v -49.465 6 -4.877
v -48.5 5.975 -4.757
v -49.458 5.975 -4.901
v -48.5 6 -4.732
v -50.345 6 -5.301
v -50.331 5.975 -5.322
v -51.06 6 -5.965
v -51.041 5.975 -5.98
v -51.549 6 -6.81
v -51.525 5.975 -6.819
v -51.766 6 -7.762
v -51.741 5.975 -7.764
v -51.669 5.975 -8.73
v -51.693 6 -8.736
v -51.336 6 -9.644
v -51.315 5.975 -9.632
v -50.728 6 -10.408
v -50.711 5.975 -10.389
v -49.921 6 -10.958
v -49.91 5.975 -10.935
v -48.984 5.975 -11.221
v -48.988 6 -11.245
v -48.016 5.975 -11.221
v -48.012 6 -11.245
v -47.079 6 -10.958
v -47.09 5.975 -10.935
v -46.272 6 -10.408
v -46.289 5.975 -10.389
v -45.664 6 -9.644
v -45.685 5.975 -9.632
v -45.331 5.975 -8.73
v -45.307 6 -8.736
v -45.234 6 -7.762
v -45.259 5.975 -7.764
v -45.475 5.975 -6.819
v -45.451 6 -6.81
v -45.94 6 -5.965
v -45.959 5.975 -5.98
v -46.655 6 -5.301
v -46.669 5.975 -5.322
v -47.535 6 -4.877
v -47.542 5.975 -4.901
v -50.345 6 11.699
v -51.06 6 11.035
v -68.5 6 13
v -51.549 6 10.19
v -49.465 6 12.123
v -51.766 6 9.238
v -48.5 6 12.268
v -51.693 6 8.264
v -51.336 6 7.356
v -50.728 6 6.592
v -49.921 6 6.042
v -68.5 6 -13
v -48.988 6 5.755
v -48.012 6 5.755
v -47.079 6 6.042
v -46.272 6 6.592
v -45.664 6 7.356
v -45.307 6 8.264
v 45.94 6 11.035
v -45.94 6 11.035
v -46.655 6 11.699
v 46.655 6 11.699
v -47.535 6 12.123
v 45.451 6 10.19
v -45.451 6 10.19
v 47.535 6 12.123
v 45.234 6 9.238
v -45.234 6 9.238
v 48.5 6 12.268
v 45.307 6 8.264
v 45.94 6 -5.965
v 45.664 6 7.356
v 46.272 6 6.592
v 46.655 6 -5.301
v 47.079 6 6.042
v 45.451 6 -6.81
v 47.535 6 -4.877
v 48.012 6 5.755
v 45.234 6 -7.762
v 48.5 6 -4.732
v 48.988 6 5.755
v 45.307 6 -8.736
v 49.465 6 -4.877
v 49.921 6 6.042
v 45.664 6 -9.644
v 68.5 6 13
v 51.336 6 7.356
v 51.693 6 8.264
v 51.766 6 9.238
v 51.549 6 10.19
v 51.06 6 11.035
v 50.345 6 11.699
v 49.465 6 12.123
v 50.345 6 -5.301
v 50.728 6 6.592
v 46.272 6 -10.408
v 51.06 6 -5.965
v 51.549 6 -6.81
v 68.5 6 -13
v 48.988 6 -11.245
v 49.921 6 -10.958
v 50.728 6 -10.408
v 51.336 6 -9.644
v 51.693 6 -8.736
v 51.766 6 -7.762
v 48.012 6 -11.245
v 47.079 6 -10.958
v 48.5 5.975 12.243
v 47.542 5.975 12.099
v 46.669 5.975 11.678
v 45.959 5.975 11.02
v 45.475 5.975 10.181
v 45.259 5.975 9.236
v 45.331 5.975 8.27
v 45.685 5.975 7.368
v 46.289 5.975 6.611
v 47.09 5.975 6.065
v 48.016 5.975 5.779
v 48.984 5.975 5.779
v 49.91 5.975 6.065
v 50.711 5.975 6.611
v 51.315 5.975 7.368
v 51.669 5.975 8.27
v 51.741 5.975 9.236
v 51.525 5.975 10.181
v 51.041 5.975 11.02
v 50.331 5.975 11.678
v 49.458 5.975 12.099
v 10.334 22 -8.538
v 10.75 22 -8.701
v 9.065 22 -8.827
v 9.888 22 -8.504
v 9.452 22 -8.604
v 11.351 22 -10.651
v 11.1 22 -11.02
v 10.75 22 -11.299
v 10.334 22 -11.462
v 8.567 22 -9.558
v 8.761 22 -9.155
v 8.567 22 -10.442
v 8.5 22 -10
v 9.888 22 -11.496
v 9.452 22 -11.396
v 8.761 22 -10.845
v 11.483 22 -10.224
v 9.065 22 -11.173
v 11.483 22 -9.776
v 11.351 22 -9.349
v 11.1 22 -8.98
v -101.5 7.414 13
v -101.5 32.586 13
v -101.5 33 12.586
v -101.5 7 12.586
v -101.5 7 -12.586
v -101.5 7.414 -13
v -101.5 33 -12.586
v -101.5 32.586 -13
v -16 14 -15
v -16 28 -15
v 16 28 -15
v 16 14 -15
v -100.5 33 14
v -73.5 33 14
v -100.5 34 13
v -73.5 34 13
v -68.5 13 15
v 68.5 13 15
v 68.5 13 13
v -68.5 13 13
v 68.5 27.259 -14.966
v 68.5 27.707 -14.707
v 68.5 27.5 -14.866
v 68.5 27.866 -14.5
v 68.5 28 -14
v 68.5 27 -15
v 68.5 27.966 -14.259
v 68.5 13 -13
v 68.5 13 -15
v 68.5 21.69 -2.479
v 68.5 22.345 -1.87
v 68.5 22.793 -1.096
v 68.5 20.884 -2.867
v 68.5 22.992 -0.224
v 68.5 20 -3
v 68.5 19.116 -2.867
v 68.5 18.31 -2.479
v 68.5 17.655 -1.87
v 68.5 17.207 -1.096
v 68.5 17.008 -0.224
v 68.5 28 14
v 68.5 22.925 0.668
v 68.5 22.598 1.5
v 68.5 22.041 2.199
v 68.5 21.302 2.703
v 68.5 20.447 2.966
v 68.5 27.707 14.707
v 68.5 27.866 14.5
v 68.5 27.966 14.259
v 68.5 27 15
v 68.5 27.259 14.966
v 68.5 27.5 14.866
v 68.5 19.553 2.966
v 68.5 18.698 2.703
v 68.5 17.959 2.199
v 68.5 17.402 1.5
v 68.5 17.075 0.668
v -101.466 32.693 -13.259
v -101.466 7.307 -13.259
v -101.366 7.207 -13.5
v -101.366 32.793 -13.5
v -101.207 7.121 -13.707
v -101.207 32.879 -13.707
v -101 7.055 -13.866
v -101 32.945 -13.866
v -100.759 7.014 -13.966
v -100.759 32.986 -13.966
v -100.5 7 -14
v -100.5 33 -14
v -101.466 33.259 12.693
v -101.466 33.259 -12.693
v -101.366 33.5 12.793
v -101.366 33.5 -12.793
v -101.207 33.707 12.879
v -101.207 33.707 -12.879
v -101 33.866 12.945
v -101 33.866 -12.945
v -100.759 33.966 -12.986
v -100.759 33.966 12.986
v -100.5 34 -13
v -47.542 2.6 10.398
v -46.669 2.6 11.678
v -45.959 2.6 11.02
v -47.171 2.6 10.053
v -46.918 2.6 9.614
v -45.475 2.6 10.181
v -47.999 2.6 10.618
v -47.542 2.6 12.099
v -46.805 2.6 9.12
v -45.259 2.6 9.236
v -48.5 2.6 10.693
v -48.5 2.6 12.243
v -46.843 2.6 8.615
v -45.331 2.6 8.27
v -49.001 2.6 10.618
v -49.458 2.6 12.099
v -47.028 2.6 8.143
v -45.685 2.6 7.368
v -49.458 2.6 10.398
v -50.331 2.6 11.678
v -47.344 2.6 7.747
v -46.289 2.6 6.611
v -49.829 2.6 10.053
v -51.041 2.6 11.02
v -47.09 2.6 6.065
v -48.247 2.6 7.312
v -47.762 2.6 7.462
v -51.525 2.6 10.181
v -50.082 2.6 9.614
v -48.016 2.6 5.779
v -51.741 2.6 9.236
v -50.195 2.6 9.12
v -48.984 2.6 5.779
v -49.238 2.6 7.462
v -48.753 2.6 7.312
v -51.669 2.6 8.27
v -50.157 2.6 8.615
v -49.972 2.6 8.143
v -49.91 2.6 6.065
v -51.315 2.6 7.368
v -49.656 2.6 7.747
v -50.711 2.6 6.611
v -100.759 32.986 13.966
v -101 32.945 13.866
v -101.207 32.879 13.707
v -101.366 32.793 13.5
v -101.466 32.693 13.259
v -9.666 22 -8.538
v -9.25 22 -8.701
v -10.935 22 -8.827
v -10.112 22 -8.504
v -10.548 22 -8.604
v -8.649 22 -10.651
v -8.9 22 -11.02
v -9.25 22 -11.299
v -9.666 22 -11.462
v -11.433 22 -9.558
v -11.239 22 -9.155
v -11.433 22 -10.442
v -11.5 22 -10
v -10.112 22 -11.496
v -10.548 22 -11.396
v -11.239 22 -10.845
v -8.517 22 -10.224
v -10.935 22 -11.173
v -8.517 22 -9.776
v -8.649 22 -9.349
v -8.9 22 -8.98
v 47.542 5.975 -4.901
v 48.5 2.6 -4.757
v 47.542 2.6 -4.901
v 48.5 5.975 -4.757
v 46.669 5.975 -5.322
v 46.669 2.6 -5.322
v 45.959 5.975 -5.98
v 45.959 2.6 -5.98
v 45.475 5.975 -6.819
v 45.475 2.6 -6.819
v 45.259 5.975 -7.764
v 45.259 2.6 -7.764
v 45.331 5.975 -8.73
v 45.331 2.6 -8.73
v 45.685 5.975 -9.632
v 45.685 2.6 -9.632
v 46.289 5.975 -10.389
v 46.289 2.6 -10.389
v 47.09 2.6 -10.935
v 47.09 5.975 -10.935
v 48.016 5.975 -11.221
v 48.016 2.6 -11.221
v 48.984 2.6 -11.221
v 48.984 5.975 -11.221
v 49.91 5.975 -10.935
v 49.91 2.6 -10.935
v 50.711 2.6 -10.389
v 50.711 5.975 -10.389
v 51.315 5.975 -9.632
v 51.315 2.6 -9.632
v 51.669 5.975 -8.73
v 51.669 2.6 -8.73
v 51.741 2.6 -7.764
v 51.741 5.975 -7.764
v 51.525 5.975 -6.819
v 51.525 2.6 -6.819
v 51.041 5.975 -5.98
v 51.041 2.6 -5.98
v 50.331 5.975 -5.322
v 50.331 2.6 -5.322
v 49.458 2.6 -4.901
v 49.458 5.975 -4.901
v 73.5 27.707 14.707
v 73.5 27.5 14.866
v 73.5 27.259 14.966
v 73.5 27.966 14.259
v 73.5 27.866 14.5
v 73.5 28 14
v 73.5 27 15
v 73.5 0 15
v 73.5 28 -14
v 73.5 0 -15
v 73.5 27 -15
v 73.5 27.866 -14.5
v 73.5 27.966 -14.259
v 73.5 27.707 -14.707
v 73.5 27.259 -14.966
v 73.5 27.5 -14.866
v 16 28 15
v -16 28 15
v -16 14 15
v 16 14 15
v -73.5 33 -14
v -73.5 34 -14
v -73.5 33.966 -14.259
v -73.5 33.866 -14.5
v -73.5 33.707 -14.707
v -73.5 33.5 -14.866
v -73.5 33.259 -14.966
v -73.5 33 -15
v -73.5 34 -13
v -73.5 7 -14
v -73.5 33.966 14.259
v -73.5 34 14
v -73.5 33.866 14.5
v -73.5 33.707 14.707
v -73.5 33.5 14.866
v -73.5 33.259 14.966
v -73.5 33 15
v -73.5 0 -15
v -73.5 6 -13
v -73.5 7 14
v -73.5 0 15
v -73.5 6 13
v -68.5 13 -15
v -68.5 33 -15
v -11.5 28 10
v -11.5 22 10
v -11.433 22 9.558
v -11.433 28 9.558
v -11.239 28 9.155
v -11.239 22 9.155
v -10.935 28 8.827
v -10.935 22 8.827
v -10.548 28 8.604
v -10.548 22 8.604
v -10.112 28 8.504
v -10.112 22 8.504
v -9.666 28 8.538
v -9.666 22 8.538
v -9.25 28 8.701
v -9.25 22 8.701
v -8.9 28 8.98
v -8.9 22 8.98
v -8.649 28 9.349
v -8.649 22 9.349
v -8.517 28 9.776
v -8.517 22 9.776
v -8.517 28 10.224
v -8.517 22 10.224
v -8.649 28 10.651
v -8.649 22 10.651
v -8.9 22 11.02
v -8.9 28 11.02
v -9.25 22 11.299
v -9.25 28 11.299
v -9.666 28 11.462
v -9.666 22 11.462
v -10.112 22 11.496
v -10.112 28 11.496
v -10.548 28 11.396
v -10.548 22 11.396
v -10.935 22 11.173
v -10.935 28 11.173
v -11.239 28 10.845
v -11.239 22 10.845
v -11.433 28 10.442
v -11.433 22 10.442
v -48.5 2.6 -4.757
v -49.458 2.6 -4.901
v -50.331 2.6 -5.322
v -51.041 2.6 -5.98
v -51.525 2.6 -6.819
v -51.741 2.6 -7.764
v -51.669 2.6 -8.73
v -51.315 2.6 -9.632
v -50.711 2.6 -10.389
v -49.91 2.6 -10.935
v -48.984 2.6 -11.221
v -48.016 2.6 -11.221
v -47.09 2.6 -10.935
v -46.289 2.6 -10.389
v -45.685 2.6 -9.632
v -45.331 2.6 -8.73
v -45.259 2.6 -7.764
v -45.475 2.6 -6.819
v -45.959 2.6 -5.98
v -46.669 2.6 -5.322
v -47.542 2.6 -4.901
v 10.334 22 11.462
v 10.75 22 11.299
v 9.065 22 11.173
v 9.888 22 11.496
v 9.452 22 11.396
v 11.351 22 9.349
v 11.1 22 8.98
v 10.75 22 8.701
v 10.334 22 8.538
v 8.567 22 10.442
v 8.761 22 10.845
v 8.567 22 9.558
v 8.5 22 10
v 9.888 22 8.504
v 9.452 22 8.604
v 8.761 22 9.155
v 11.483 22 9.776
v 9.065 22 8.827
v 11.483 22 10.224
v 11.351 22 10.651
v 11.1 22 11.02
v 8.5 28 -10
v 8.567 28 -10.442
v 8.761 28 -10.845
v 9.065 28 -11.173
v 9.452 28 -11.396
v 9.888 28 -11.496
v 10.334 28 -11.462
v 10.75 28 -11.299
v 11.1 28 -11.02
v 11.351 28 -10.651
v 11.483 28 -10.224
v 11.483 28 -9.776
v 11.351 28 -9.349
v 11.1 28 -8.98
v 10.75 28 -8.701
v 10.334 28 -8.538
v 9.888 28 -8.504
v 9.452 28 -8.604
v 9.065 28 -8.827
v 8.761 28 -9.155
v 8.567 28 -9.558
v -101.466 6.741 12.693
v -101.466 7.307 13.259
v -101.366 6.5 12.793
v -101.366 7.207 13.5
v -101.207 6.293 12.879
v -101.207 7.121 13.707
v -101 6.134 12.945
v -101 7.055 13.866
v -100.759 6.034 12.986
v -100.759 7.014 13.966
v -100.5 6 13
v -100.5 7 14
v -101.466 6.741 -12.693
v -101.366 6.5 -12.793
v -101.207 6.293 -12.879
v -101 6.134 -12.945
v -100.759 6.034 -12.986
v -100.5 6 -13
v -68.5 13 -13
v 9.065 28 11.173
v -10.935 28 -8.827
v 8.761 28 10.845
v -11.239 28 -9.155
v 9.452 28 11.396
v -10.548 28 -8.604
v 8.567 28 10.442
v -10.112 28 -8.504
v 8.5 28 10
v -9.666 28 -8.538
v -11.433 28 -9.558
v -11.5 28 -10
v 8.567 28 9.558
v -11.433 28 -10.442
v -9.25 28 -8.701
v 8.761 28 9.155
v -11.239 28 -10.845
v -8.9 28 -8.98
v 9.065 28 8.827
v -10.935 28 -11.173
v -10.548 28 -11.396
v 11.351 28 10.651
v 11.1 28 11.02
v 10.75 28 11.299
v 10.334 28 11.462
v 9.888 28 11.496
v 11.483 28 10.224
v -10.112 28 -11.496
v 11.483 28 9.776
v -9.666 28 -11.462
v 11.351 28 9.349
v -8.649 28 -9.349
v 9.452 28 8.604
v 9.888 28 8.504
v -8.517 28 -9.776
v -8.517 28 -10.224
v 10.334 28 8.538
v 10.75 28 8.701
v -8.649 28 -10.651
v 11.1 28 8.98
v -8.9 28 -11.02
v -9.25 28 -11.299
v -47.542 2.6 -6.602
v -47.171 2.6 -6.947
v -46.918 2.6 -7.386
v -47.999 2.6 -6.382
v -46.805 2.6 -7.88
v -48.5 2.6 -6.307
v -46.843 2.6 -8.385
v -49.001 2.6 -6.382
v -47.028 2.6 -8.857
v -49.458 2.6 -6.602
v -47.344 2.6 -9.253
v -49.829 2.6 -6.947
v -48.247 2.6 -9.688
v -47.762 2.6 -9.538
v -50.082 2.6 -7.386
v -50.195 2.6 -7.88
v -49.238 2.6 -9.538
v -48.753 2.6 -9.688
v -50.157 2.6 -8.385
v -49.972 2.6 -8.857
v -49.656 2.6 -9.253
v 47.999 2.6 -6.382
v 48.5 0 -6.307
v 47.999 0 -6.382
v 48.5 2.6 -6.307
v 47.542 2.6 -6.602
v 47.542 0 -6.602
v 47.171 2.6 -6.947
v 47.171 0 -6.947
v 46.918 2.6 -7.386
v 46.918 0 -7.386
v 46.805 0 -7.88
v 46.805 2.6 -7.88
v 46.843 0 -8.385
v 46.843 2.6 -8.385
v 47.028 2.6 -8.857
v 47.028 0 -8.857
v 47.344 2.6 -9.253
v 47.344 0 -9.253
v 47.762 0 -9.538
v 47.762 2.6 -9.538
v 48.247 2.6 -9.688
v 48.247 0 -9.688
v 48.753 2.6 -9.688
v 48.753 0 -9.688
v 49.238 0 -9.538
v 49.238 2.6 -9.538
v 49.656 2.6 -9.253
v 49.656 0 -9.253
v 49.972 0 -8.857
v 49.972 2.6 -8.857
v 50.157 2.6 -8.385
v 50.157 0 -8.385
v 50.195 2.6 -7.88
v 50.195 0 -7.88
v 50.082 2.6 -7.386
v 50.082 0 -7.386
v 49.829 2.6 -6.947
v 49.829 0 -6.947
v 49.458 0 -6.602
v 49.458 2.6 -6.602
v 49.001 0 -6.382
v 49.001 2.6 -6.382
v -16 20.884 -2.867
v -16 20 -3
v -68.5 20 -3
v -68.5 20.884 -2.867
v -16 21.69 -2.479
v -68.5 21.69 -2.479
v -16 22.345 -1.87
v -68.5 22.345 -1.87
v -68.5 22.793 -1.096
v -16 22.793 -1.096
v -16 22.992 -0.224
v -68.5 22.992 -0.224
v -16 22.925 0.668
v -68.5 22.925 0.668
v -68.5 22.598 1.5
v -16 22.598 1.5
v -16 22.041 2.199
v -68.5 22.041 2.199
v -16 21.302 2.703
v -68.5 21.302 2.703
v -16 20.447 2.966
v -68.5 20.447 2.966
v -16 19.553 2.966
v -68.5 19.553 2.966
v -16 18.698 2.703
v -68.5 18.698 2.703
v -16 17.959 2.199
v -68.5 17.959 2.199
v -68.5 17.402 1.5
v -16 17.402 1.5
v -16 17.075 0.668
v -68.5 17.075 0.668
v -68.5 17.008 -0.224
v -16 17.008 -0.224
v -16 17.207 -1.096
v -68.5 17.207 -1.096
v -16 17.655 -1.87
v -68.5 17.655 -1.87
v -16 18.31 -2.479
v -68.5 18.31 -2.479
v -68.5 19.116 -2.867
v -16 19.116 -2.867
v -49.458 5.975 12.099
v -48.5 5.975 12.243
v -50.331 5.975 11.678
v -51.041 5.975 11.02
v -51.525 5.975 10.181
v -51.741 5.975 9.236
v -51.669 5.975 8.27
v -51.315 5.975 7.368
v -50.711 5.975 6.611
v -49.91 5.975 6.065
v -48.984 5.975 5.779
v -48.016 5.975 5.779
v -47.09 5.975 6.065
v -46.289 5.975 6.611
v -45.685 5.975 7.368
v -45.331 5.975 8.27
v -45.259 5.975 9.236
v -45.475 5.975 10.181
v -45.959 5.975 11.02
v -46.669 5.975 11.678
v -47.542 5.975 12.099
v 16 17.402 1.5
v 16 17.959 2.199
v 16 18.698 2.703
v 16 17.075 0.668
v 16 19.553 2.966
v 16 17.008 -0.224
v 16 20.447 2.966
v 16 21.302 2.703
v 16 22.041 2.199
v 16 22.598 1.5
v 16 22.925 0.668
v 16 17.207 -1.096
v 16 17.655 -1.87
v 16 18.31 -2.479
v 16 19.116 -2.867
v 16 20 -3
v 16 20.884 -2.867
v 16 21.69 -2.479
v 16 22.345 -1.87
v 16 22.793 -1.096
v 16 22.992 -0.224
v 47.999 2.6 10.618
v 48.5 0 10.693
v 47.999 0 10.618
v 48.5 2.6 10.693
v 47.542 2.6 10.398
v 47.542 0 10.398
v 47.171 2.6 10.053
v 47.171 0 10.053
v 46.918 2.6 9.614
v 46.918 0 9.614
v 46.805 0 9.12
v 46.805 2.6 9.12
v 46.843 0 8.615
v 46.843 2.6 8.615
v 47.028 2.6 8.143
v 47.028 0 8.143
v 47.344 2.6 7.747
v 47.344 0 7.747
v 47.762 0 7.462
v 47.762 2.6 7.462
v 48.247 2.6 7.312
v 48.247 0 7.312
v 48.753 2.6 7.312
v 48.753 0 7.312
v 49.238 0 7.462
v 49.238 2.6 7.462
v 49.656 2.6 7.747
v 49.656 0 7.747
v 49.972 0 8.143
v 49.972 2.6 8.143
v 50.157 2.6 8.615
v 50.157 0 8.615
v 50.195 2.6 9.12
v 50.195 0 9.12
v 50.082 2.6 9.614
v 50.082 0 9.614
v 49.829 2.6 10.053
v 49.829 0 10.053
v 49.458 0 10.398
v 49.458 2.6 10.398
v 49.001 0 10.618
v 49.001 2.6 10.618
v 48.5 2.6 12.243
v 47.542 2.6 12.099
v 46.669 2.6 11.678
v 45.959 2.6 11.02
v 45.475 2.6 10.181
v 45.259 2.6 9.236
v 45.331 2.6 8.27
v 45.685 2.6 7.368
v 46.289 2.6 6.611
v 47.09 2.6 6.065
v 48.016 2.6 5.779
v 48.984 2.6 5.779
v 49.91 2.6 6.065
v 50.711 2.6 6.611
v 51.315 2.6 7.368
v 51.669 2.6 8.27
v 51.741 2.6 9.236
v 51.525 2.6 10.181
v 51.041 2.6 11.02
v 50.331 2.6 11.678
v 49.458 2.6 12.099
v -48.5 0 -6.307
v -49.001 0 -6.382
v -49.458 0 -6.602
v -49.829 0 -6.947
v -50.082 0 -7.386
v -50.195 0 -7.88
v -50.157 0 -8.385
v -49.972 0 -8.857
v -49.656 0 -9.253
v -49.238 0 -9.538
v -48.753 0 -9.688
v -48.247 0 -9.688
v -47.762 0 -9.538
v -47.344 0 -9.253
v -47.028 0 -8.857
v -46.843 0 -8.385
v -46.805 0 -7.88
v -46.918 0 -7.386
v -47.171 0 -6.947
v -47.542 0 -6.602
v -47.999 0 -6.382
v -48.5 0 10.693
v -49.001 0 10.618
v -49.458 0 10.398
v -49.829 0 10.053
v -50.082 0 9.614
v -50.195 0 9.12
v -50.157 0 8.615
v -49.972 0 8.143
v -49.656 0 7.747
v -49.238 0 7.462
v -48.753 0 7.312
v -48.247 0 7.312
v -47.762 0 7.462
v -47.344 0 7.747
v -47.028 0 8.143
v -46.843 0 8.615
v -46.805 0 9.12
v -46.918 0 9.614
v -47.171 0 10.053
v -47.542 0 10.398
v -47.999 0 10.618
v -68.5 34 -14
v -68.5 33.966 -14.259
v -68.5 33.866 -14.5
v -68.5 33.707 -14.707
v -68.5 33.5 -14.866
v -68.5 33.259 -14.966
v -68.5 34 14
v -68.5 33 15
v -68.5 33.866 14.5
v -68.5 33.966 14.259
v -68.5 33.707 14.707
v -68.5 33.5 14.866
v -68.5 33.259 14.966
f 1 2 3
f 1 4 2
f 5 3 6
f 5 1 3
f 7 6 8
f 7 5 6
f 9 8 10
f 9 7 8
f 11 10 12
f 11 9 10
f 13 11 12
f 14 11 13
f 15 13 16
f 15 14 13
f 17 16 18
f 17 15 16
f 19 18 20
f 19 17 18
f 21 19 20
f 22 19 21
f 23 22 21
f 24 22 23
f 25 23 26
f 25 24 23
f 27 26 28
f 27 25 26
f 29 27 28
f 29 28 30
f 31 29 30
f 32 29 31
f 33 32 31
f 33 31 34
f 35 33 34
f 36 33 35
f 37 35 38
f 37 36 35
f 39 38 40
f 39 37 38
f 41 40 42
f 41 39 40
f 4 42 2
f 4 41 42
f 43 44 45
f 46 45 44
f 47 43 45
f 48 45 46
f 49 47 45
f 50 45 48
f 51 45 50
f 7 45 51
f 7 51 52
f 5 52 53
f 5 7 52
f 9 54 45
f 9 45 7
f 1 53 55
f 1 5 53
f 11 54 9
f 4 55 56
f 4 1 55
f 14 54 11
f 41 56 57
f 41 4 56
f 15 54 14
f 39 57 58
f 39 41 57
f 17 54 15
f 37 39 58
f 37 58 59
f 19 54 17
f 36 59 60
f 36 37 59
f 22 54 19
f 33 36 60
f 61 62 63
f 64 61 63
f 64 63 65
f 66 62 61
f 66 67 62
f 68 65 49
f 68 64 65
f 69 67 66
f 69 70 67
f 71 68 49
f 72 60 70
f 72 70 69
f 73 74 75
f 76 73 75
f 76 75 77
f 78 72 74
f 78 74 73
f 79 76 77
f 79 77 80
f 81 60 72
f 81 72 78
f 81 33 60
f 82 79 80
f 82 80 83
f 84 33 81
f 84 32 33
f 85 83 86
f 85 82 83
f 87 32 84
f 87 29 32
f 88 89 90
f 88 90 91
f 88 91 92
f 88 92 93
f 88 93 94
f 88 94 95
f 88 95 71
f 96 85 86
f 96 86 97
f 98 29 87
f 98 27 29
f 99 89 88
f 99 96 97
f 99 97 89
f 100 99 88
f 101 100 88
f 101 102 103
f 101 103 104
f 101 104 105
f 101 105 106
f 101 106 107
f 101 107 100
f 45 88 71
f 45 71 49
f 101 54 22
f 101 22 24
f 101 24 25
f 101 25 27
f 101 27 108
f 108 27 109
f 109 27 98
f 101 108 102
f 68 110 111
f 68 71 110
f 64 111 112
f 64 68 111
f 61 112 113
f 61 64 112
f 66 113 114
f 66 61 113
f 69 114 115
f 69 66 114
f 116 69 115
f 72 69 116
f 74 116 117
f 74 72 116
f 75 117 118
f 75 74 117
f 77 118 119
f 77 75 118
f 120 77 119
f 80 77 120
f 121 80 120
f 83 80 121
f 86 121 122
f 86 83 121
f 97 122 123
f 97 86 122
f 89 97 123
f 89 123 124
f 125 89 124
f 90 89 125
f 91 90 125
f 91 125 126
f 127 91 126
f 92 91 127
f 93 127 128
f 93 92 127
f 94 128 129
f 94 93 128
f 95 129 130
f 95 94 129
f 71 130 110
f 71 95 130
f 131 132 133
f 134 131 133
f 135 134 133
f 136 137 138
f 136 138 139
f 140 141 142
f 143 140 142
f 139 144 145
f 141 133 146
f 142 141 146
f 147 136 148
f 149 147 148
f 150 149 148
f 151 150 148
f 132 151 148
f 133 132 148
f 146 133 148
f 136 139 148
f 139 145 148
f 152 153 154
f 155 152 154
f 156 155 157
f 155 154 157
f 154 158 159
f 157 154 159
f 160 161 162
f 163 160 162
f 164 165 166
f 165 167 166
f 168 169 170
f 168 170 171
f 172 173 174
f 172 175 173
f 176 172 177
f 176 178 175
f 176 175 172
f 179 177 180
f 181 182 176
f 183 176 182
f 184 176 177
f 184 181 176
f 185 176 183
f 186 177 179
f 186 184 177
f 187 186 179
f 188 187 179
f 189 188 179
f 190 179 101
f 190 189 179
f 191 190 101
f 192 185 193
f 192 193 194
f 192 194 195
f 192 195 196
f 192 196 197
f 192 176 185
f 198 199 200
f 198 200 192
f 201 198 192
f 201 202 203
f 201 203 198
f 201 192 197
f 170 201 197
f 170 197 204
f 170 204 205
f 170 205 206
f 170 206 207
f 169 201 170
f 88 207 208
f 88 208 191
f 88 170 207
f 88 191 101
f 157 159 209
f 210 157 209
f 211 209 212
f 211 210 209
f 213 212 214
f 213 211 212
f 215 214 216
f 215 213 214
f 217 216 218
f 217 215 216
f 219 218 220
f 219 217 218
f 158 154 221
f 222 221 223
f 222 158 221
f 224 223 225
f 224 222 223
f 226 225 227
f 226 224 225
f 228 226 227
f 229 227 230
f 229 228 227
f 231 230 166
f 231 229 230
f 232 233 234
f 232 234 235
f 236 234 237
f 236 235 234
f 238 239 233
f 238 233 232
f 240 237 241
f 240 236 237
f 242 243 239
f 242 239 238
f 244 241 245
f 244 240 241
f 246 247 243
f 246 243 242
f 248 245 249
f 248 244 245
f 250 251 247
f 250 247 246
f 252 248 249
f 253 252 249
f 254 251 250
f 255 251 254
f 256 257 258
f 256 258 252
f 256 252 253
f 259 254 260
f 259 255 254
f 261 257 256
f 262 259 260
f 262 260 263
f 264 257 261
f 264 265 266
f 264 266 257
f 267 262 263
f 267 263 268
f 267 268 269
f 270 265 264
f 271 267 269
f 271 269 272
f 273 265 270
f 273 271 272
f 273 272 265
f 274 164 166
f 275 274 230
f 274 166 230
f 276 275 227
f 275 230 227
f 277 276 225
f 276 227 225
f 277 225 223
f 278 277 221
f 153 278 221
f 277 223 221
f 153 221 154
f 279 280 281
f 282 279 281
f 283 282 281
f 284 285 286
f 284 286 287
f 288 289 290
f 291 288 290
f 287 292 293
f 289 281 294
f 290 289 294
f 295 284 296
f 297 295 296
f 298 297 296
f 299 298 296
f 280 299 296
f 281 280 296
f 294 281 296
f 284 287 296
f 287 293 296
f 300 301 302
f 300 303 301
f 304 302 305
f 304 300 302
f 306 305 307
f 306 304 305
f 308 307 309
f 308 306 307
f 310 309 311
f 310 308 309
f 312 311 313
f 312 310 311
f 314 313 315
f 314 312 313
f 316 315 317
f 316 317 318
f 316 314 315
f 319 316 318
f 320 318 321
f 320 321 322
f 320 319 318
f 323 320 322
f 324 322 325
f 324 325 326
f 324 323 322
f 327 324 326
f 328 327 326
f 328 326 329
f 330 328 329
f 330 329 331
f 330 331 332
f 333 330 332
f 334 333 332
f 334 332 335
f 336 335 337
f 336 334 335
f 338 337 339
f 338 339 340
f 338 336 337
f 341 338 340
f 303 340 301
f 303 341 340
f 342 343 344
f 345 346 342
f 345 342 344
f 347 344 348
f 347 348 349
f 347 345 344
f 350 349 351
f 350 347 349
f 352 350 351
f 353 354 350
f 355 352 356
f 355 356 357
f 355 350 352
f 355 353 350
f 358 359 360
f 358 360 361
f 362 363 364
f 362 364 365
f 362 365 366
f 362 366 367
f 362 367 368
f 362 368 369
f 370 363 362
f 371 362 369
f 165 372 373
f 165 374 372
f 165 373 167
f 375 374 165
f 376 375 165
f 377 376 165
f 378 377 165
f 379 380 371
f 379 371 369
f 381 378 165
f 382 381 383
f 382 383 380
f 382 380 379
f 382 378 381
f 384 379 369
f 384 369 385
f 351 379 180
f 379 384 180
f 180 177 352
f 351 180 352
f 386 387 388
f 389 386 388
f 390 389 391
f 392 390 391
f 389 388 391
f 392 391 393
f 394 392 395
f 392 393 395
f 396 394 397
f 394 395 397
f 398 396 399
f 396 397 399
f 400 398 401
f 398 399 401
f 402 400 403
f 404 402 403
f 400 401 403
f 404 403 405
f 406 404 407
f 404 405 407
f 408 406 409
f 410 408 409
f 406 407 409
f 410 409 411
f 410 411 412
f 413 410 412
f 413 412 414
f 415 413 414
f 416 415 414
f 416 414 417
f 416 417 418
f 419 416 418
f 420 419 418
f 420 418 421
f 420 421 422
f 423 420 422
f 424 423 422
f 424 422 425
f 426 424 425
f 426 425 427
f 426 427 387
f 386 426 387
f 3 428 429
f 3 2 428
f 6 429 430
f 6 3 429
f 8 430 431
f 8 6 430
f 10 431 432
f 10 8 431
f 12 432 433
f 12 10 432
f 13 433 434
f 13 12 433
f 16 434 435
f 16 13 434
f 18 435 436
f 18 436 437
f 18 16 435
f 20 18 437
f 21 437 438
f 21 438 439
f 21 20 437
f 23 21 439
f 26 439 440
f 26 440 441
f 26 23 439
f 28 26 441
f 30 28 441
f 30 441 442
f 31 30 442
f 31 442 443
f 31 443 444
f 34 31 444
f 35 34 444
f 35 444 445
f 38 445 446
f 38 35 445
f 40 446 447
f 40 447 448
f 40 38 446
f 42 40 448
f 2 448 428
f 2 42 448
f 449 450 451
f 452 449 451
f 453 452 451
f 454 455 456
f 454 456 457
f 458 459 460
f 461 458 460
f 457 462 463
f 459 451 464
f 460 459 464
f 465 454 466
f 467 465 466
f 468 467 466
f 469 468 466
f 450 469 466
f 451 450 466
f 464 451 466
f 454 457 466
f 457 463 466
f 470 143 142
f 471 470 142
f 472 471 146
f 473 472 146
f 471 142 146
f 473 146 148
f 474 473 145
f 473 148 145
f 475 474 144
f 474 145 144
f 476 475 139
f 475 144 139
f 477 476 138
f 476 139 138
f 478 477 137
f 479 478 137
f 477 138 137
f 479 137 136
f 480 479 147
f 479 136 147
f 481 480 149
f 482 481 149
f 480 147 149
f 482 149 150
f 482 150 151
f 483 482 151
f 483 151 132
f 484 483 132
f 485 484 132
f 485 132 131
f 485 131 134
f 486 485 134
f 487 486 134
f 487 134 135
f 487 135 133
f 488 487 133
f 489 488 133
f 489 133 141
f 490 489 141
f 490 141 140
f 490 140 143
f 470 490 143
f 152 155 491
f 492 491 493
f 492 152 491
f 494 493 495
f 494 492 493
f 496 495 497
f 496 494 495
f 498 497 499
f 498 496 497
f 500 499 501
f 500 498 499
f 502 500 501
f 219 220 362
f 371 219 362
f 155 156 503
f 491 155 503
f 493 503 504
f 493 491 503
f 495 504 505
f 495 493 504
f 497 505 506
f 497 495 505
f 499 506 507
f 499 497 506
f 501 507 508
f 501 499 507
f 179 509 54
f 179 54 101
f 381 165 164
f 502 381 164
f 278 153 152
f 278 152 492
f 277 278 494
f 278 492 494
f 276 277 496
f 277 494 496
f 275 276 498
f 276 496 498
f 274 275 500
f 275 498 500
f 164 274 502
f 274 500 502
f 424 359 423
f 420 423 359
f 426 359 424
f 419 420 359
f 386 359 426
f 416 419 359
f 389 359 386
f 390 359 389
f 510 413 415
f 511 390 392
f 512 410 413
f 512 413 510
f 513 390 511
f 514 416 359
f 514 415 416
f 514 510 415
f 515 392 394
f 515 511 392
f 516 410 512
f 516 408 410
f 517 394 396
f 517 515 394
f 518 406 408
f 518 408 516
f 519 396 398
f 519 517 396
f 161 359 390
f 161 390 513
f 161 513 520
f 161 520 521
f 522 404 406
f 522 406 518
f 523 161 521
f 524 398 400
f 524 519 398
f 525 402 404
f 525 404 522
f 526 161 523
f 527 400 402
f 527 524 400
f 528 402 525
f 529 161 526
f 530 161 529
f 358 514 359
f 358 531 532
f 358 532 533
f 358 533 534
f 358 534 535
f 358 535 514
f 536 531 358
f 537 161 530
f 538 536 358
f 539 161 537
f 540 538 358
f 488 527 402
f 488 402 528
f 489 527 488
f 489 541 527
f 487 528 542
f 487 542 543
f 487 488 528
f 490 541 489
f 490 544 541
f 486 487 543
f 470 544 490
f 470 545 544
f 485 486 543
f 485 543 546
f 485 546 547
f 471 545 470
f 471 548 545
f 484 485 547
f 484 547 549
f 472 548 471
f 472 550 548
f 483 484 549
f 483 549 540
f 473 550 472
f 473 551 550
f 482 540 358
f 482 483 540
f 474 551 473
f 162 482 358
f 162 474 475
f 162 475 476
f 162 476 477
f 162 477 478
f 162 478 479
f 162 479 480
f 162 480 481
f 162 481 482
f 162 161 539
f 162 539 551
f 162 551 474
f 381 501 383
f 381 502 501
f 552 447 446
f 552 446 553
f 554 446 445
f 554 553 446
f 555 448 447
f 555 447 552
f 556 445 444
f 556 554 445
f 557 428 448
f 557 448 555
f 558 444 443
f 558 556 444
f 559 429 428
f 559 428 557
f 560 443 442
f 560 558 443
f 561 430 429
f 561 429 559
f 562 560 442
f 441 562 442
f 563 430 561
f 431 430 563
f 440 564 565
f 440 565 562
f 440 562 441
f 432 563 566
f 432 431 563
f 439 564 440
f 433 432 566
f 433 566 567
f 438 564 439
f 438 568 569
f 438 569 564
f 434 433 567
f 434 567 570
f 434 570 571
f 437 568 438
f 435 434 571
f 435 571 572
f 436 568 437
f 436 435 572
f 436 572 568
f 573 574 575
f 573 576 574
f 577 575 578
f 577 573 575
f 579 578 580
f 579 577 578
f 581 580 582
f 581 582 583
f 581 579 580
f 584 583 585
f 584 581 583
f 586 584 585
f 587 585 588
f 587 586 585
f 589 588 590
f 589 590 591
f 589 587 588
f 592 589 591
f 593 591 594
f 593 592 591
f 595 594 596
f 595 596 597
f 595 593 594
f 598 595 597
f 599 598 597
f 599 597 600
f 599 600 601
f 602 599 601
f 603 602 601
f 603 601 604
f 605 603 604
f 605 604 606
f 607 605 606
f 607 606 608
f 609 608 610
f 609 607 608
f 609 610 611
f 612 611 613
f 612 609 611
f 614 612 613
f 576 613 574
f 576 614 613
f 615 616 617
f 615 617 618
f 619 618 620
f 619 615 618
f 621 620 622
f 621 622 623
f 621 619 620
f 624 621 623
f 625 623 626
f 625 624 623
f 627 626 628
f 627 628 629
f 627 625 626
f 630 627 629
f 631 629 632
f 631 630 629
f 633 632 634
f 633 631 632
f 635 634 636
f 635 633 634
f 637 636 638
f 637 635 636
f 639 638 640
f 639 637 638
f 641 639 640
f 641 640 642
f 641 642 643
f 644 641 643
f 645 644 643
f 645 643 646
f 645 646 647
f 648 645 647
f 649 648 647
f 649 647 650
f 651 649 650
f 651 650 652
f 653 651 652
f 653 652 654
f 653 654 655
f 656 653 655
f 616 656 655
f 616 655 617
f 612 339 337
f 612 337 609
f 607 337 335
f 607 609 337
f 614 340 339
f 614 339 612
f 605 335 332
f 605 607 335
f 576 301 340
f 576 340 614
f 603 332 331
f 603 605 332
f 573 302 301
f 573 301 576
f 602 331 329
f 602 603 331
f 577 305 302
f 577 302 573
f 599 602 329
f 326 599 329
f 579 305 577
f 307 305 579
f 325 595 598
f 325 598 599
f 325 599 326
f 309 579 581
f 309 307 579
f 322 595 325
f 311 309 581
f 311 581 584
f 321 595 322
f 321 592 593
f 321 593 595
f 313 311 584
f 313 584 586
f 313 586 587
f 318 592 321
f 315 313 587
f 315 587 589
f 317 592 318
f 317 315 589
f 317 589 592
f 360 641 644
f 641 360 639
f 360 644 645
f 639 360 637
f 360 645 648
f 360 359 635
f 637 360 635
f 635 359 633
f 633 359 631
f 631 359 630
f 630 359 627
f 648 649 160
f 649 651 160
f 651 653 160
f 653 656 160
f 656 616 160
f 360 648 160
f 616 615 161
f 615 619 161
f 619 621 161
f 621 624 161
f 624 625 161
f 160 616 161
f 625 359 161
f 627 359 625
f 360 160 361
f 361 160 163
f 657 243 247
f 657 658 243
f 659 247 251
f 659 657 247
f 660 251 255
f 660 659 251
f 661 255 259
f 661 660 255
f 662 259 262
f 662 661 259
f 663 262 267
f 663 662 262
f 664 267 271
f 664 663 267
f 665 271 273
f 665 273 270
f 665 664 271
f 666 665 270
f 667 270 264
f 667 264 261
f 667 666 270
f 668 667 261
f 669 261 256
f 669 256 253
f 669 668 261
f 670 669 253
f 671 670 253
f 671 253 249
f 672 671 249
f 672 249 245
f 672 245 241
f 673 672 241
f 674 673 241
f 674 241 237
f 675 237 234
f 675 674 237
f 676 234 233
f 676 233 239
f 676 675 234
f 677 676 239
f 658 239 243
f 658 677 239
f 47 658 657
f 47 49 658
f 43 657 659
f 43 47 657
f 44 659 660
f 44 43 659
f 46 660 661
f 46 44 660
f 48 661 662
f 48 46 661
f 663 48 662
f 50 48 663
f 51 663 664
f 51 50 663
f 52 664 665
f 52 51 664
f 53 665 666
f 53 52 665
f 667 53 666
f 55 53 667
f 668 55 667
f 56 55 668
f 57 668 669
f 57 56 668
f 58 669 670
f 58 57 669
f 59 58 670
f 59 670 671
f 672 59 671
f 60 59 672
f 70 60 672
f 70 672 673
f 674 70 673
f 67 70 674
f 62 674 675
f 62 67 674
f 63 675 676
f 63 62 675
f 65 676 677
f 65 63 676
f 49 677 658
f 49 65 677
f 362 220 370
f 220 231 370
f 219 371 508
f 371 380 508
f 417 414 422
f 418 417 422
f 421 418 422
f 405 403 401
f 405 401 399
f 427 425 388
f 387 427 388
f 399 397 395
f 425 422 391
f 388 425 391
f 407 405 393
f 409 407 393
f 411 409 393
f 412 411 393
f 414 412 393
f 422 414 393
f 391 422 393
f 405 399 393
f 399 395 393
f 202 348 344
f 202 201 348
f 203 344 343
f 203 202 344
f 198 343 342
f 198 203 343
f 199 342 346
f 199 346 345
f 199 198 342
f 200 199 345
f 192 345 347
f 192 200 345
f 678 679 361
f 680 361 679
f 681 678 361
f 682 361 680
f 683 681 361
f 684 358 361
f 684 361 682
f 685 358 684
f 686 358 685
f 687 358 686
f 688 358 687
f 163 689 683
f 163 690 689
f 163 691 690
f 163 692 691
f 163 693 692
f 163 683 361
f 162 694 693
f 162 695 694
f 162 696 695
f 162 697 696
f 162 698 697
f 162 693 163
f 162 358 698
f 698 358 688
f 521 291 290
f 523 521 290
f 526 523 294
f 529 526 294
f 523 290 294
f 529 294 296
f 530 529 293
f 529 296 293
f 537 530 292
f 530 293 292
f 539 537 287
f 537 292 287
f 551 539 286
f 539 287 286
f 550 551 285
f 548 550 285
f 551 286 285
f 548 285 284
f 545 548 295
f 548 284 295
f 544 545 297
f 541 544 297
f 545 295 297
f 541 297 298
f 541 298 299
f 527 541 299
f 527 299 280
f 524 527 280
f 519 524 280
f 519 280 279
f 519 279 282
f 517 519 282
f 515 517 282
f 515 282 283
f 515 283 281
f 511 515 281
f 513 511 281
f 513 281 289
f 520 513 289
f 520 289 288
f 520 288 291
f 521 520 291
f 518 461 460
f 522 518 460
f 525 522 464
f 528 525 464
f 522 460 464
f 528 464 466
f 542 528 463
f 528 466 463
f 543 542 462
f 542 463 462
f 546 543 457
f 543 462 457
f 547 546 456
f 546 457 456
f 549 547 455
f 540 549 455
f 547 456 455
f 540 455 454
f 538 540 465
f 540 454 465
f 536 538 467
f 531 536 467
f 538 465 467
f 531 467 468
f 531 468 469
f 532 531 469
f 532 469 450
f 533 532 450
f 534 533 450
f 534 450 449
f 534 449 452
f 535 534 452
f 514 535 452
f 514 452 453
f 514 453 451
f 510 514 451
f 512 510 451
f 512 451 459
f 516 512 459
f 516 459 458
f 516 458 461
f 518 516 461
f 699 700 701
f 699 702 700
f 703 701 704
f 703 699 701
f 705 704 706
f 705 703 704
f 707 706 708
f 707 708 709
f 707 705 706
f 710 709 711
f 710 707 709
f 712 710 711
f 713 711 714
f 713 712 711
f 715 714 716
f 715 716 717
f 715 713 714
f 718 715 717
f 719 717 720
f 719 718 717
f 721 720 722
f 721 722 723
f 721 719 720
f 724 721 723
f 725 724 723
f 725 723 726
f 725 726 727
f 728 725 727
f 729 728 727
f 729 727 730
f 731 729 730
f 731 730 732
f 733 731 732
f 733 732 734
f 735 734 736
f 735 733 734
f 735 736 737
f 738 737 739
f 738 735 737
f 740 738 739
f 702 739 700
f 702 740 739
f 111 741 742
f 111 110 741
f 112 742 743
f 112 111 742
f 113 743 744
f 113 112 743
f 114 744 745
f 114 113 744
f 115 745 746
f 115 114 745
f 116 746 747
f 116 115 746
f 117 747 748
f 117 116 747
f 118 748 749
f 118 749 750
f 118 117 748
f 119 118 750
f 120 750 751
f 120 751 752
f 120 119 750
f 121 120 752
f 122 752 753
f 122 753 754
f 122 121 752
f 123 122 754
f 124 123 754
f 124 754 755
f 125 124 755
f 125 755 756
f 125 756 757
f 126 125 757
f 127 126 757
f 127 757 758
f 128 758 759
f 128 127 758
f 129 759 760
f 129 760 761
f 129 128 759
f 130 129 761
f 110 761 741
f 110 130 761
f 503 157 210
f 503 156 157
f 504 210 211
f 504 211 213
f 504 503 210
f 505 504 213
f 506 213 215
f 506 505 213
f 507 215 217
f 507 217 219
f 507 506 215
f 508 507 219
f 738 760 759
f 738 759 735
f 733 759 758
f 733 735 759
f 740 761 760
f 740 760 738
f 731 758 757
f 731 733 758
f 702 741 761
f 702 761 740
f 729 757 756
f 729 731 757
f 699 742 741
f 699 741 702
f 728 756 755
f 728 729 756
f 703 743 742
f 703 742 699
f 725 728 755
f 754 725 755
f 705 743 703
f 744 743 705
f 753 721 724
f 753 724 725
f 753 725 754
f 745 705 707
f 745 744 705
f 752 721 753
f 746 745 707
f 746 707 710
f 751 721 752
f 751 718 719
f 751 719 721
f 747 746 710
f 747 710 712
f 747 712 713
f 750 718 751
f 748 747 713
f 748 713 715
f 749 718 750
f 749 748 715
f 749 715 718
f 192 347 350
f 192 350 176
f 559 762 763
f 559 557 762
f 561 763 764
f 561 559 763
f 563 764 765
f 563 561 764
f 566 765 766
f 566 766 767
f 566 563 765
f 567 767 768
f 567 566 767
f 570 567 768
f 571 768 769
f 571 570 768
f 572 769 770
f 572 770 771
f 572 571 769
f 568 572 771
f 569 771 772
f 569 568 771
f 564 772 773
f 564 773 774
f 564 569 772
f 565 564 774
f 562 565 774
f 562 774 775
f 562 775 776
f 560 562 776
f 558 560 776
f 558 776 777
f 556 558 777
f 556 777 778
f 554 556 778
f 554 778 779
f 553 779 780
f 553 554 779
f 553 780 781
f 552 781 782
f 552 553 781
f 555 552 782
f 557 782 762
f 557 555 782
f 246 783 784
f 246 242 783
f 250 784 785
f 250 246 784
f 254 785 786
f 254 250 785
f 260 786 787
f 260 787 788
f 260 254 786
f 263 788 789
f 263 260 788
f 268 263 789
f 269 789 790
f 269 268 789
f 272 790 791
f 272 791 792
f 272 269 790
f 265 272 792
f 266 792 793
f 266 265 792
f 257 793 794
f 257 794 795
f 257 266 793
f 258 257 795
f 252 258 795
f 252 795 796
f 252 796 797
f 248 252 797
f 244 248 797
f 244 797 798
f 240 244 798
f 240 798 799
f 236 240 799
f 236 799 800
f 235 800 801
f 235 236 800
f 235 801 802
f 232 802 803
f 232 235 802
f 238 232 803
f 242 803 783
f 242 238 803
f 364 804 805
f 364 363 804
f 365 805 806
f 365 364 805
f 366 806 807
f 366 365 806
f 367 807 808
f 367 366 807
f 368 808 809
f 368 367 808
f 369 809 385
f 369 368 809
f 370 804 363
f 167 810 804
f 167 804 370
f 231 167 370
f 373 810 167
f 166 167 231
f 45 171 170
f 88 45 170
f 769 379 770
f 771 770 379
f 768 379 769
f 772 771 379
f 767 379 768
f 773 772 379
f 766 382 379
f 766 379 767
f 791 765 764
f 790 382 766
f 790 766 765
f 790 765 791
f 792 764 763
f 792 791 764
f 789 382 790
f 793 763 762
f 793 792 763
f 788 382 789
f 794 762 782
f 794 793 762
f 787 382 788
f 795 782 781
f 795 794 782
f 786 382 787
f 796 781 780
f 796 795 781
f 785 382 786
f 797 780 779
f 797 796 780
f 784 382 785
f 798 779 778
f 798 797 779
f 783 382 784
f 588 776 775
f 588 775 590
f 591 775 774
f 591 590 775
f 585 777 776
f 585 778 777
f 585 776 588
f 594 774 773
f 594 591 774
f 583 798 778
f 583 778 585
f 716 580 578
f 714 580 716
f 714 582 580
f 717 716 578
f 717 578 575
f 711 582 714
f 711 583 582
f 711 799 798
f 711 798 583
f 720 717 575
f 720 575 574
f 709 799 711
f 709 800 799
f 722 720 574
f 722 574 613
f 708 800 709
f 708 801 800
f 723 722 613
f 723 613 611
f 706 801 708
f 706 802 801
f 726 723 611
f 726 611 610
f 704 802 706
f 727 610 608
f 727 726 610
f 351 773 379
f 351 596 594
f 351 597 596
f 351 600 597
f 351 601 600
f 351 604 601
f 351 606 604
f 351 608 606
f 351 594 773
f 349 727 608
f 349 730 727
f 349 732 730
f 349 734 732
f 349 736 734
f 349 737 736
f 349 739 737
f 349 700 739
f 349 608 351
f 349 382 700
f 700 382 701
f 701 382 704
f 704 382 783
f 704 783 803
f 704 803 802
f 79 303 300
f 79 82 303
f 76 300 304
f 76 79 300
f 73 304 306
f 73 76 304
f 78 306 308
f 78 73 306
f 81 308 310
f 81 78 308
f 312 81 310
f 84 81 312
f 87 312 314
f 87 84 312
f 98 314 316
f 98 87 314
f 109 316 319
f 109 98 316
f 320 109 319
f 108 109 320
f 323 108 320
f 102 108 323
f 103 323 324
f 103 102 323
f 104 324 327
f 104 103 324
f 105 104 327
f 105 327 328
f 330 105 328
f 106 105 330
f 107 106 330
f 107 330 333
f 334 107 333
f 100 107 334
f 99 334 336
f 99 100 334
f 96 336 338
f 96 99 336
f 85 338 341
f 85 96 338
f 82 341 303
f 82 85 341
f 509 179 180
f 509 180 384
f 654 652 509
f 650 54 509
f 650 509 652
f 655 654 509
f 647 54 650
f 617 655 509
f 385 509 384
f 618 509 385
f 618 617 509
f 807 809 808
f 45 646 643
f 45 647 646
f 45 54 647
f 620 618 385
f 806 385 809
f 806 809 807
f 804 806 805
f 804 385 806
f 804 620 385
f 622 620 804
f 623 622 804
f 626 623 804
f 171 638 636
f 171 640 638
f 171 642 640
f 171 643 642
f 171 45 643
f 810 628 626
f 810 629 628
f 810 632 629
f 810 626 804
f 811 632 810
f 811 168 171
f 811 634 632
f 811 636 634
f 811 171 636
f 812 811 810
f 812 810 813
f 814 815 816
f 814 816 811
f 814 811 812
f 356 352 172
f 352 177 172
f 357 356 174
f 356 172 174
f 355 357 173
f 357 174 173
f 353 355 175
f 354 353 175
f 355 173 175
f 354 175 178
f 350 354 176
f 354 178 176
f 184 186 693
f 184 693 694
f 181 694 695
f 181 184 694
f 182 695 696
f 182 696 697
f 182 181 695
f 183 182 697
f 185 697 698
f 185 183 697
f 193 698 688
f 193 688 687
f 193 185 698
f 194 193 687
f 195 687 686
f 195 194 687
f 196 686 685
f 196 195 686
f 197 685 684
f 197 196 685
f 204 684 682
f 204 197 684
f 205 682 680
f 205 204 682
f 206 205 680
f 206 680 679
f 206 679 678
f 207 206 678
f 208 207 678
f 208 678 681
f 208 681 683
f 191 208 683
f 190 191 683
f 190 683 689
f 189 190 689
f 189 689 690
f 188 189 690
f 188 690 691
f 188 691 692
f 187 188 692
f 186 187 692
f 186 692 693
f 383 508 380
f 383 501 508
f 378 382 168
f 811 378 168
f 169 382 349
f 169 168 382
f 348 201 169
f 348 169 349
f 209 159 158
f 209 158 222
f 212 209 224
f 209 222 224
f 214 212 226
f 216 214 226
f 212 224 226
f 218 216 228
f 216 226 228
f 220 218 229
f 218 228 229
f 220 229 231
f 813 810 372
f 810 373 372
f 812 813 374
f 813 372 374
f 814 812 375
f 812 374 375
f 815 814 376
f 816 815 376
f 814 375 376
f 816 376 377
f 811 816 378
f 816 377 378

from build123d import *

# Parameters (mm, degrees)
BOSS_EXTRUDE1_DEPTH                          = 15
SKETCH2_W                                    = 137
SKETCH2_H                                    = 26
CUT_EXTRUDE1_DEPTH                           = 7
SKETCH3_R                                    = 3
BOSS_EXTRUDE2_DEPTH                          = 142
CUT_EXTRUDE2_DEPTH                           = 35
CHAMFER1_SIZE                                = 1
FILLET1_R                                    = 1
FILLET2_R                                    = 1
CBORE_FOR_M3_HEX_SOCKET_HEAD_CAP_SCR_2_COUNT = 2
CBORE_FOR_M3_HEX_SOCKET_HEAD_CAP_SCR_2_PITCH = 17
CBORE_FOR_M3_HEX_SOCKET_HEAD_CAP_SCR_3_COUNT = 2
CBORE_FOR_M3_HEX_SOCKET_HEAD_CAP_SCR_3_PITCH = 97
CBORE_FOR_M3_HEX_SOCKET_HEAD_CAP_SCR_4_COUNT = 2
CBORE_FOR_M3_HEX_SOCKET_HEAD_CAP_SCR_4_PITCH = 98.478424033
SKETCH7_W                                    = 32
SKETCH7_H                                    = 30
BOSS_EXTRUDE3_DEPTH                          = 14
HOLE1_D                                      = 3
HOLE1_DEPTH                                  = 6


with BuildPart() as part:
    # Sketch1 → Boss-Extrude1 (new body, symmetric)
    with BuildSketch(Plane.XY):
        Polygon((-103.5, 34), (-103.5, 6), (-73.5, 6), (-73.5, 0), (73.5, 0), (73.5, 28), (68.5, 28), (68.5, 13), (-68.5, 13), (-68.5, 34), align=None)
    extrude(amount=BOSS_EXTRUDE1_DEPTH, both=True)

    # Sketch2 → Cut-Extrude1 (cut)
    with BuildSketch(Plane(origin=(0, 13, 0), x_dir=(1, 0, 0), z_dir=(0, 1, 0))):
        Rectangle(SKETCH2_W, SKETCH2_H)
    extrude(amount=-CUT_EXTRUDE1_DEPTH, mode=Mode.SUBTRACT)

    # Sketch3 → Boss-Extrude2 (add)
    with BuildSketch(Plane(origin=(73.5, 0, 0), x_dir=(0, 0, -1), z_dir=(1, 0, 0))):
        with Locations((0, 20)):
            Circle(SKETCH3_R)
    extrude(amount=-BOSS_EXTRUDE2_DEPTH)

    # Sketch4 → Cut-Extrude2 (cut, through all)
    with BuildSketch(Plane(origin=(0, 34, 0), x_dir=(1, 0, 0), z_dir=(0, 1, 0))):
        Polygon((-73.5, -15), (-73.5, -14), (-101.5, -14), (-101.5, 14), (-73.5, 14), (-73.5, 15), (-103.5, 15), (-103.5, -15), align=None)
    extrude(amount=-CUT_EXTRUDE2_DEPTH, mode=Mode.SUBTRACT)

    # Chamfer1
    chamfer1_edges = [part.edges().sort_by_distance(p)[0] for p in [
        (-87.5, 6, -14),
        (-87.5, 6, 14),
        (-87.5, 34, 14),
        (-87.5, 34, -14),
    ]]
    chamfer(chamfer1_edges, length=CHAMFER1_SIZE)

    # Fillet1
    fillet1_edges = [part.edges().sort_by_distance(p)[0] for p in [
        (-101.5, 34, 0),
        (-101.5, 20, -14),
        (-101.5, 33.5, 13.5),
        (-101.5, 33.5, -13.5),
        (-101.5, 6.5, -13.5),
        (-101.5, 6.5, 13.5),
        (-101.5, 6, 0),
        (-101.5, 20, 14),
    ]]
    fillet(fillet1_edges, radius=FILLET1_R)

    # Fillet2
    fillet2_edges = [part.edges().sort_by_distance(p)[0] for p in [
        (-71, 34, -15),
        (71, 28, -15),
        (71, 28, 15),
        (-71, 34, 15),
    ]]
    fillet(fillet2_edges, radius=FILLET2_R)

    # Sketch6 → CBORE for M3 Hex Socket Head Cap Screw1 (revolve, cut)
    with BuildSketch(Plane(origin=(-48.5, 6, -8.006829487), x_dir=(0, 0, 1), z_dir=(1, 0, 0))):
        Polygon((0, 0), (0, 6), (1.7, 6), (1.7, 3.4), (3.25, 3.4), (3.25, 0.025), (3.275, 0), align=None)
    cbore_for_m3_hex_socket_head_cap_screw1 = revolve(axis=Axis((-48.5, 12.35, -8.006829487), (0, -1, 0)), mode=Mode.SUBTRACT)

    # CBORE for M3 Hex Socket Head Cap Scr 2: CBORE for M3 Hex Socket Head Cap Screw1 ×2
    with Locations(*[(0, 0, i * CBORE_FOR_M3_HEX_SOCKET_HEAD_CAP_SCR_2_PITCH) for i in range(1, CBORE_FOR_M3_HEX_SOCKET_HEAD_CAP_SCR_2_COUNT)]):
        add(cbore_for_m3_hex_socket_head_cap_screw1, mode=Mode.SUBTRACT)

    # CBORE for M3 Hex Socket Head Cap Scr 3: CBORE for M3 Hex Socket Head Cap Screw1 ×2
    with Locations(*[(i * CBORE_FOR_M3_HEX_SOCKET_HEAD_CAP_SCR_3_PITCH, 0, 0) for i in range(1, CBORE_FOR_M3_HEX_SOCKET_HEAD_CAP_SCR_3_COUNT)]):
        add(cbore_for_m3_hex_socket_head_cap_screw1, mode=Mode.SUBTRACT)

    # CBORE for M3 Hex Socket Head Cap Scr 4: CBORE for M3 Hex Socket Head Cap Screw1 ×2
    with Locations(*[Vector(0.984987331, 0, 0.172626646) * (i * CBORE_FOR_M3_HEX_SOCKET_HEAD_CAP_SCR_4_PITCH) for i in range(1, CBORE_FOR_M3_HEX_SOCKET_HEAD_CAP_SCR_4_COUNT)]):
        add(cbore_for_m3_hex_socket_head_cap_screw1, mode=Mode.SUBTRACT)

    # Sketch7 → Boss-Extrude3 (add)
    with BuildSketch(Plane(origin=(0, 28, 0), x_dir=(1, 0, 0), z_dir=(0, 1, 0))):
        Rectangle(SKETCH7_W, SKETCH7_H)
    extrude(amount=-BOSS_EXTRUDE3_DEPTH)

    # Hole1
    with Locations(Plane(origin=(0, 28, 0), x_dir=(1, 0, 0), z_dir=(0, 1, 0))):
        with Locations((10, 10), (10, -10), (-10, -10), (-10, 10)):
            Hole(HOLE1_D / 2, depth=HOLE1_DEPTH)


solid = part.part
